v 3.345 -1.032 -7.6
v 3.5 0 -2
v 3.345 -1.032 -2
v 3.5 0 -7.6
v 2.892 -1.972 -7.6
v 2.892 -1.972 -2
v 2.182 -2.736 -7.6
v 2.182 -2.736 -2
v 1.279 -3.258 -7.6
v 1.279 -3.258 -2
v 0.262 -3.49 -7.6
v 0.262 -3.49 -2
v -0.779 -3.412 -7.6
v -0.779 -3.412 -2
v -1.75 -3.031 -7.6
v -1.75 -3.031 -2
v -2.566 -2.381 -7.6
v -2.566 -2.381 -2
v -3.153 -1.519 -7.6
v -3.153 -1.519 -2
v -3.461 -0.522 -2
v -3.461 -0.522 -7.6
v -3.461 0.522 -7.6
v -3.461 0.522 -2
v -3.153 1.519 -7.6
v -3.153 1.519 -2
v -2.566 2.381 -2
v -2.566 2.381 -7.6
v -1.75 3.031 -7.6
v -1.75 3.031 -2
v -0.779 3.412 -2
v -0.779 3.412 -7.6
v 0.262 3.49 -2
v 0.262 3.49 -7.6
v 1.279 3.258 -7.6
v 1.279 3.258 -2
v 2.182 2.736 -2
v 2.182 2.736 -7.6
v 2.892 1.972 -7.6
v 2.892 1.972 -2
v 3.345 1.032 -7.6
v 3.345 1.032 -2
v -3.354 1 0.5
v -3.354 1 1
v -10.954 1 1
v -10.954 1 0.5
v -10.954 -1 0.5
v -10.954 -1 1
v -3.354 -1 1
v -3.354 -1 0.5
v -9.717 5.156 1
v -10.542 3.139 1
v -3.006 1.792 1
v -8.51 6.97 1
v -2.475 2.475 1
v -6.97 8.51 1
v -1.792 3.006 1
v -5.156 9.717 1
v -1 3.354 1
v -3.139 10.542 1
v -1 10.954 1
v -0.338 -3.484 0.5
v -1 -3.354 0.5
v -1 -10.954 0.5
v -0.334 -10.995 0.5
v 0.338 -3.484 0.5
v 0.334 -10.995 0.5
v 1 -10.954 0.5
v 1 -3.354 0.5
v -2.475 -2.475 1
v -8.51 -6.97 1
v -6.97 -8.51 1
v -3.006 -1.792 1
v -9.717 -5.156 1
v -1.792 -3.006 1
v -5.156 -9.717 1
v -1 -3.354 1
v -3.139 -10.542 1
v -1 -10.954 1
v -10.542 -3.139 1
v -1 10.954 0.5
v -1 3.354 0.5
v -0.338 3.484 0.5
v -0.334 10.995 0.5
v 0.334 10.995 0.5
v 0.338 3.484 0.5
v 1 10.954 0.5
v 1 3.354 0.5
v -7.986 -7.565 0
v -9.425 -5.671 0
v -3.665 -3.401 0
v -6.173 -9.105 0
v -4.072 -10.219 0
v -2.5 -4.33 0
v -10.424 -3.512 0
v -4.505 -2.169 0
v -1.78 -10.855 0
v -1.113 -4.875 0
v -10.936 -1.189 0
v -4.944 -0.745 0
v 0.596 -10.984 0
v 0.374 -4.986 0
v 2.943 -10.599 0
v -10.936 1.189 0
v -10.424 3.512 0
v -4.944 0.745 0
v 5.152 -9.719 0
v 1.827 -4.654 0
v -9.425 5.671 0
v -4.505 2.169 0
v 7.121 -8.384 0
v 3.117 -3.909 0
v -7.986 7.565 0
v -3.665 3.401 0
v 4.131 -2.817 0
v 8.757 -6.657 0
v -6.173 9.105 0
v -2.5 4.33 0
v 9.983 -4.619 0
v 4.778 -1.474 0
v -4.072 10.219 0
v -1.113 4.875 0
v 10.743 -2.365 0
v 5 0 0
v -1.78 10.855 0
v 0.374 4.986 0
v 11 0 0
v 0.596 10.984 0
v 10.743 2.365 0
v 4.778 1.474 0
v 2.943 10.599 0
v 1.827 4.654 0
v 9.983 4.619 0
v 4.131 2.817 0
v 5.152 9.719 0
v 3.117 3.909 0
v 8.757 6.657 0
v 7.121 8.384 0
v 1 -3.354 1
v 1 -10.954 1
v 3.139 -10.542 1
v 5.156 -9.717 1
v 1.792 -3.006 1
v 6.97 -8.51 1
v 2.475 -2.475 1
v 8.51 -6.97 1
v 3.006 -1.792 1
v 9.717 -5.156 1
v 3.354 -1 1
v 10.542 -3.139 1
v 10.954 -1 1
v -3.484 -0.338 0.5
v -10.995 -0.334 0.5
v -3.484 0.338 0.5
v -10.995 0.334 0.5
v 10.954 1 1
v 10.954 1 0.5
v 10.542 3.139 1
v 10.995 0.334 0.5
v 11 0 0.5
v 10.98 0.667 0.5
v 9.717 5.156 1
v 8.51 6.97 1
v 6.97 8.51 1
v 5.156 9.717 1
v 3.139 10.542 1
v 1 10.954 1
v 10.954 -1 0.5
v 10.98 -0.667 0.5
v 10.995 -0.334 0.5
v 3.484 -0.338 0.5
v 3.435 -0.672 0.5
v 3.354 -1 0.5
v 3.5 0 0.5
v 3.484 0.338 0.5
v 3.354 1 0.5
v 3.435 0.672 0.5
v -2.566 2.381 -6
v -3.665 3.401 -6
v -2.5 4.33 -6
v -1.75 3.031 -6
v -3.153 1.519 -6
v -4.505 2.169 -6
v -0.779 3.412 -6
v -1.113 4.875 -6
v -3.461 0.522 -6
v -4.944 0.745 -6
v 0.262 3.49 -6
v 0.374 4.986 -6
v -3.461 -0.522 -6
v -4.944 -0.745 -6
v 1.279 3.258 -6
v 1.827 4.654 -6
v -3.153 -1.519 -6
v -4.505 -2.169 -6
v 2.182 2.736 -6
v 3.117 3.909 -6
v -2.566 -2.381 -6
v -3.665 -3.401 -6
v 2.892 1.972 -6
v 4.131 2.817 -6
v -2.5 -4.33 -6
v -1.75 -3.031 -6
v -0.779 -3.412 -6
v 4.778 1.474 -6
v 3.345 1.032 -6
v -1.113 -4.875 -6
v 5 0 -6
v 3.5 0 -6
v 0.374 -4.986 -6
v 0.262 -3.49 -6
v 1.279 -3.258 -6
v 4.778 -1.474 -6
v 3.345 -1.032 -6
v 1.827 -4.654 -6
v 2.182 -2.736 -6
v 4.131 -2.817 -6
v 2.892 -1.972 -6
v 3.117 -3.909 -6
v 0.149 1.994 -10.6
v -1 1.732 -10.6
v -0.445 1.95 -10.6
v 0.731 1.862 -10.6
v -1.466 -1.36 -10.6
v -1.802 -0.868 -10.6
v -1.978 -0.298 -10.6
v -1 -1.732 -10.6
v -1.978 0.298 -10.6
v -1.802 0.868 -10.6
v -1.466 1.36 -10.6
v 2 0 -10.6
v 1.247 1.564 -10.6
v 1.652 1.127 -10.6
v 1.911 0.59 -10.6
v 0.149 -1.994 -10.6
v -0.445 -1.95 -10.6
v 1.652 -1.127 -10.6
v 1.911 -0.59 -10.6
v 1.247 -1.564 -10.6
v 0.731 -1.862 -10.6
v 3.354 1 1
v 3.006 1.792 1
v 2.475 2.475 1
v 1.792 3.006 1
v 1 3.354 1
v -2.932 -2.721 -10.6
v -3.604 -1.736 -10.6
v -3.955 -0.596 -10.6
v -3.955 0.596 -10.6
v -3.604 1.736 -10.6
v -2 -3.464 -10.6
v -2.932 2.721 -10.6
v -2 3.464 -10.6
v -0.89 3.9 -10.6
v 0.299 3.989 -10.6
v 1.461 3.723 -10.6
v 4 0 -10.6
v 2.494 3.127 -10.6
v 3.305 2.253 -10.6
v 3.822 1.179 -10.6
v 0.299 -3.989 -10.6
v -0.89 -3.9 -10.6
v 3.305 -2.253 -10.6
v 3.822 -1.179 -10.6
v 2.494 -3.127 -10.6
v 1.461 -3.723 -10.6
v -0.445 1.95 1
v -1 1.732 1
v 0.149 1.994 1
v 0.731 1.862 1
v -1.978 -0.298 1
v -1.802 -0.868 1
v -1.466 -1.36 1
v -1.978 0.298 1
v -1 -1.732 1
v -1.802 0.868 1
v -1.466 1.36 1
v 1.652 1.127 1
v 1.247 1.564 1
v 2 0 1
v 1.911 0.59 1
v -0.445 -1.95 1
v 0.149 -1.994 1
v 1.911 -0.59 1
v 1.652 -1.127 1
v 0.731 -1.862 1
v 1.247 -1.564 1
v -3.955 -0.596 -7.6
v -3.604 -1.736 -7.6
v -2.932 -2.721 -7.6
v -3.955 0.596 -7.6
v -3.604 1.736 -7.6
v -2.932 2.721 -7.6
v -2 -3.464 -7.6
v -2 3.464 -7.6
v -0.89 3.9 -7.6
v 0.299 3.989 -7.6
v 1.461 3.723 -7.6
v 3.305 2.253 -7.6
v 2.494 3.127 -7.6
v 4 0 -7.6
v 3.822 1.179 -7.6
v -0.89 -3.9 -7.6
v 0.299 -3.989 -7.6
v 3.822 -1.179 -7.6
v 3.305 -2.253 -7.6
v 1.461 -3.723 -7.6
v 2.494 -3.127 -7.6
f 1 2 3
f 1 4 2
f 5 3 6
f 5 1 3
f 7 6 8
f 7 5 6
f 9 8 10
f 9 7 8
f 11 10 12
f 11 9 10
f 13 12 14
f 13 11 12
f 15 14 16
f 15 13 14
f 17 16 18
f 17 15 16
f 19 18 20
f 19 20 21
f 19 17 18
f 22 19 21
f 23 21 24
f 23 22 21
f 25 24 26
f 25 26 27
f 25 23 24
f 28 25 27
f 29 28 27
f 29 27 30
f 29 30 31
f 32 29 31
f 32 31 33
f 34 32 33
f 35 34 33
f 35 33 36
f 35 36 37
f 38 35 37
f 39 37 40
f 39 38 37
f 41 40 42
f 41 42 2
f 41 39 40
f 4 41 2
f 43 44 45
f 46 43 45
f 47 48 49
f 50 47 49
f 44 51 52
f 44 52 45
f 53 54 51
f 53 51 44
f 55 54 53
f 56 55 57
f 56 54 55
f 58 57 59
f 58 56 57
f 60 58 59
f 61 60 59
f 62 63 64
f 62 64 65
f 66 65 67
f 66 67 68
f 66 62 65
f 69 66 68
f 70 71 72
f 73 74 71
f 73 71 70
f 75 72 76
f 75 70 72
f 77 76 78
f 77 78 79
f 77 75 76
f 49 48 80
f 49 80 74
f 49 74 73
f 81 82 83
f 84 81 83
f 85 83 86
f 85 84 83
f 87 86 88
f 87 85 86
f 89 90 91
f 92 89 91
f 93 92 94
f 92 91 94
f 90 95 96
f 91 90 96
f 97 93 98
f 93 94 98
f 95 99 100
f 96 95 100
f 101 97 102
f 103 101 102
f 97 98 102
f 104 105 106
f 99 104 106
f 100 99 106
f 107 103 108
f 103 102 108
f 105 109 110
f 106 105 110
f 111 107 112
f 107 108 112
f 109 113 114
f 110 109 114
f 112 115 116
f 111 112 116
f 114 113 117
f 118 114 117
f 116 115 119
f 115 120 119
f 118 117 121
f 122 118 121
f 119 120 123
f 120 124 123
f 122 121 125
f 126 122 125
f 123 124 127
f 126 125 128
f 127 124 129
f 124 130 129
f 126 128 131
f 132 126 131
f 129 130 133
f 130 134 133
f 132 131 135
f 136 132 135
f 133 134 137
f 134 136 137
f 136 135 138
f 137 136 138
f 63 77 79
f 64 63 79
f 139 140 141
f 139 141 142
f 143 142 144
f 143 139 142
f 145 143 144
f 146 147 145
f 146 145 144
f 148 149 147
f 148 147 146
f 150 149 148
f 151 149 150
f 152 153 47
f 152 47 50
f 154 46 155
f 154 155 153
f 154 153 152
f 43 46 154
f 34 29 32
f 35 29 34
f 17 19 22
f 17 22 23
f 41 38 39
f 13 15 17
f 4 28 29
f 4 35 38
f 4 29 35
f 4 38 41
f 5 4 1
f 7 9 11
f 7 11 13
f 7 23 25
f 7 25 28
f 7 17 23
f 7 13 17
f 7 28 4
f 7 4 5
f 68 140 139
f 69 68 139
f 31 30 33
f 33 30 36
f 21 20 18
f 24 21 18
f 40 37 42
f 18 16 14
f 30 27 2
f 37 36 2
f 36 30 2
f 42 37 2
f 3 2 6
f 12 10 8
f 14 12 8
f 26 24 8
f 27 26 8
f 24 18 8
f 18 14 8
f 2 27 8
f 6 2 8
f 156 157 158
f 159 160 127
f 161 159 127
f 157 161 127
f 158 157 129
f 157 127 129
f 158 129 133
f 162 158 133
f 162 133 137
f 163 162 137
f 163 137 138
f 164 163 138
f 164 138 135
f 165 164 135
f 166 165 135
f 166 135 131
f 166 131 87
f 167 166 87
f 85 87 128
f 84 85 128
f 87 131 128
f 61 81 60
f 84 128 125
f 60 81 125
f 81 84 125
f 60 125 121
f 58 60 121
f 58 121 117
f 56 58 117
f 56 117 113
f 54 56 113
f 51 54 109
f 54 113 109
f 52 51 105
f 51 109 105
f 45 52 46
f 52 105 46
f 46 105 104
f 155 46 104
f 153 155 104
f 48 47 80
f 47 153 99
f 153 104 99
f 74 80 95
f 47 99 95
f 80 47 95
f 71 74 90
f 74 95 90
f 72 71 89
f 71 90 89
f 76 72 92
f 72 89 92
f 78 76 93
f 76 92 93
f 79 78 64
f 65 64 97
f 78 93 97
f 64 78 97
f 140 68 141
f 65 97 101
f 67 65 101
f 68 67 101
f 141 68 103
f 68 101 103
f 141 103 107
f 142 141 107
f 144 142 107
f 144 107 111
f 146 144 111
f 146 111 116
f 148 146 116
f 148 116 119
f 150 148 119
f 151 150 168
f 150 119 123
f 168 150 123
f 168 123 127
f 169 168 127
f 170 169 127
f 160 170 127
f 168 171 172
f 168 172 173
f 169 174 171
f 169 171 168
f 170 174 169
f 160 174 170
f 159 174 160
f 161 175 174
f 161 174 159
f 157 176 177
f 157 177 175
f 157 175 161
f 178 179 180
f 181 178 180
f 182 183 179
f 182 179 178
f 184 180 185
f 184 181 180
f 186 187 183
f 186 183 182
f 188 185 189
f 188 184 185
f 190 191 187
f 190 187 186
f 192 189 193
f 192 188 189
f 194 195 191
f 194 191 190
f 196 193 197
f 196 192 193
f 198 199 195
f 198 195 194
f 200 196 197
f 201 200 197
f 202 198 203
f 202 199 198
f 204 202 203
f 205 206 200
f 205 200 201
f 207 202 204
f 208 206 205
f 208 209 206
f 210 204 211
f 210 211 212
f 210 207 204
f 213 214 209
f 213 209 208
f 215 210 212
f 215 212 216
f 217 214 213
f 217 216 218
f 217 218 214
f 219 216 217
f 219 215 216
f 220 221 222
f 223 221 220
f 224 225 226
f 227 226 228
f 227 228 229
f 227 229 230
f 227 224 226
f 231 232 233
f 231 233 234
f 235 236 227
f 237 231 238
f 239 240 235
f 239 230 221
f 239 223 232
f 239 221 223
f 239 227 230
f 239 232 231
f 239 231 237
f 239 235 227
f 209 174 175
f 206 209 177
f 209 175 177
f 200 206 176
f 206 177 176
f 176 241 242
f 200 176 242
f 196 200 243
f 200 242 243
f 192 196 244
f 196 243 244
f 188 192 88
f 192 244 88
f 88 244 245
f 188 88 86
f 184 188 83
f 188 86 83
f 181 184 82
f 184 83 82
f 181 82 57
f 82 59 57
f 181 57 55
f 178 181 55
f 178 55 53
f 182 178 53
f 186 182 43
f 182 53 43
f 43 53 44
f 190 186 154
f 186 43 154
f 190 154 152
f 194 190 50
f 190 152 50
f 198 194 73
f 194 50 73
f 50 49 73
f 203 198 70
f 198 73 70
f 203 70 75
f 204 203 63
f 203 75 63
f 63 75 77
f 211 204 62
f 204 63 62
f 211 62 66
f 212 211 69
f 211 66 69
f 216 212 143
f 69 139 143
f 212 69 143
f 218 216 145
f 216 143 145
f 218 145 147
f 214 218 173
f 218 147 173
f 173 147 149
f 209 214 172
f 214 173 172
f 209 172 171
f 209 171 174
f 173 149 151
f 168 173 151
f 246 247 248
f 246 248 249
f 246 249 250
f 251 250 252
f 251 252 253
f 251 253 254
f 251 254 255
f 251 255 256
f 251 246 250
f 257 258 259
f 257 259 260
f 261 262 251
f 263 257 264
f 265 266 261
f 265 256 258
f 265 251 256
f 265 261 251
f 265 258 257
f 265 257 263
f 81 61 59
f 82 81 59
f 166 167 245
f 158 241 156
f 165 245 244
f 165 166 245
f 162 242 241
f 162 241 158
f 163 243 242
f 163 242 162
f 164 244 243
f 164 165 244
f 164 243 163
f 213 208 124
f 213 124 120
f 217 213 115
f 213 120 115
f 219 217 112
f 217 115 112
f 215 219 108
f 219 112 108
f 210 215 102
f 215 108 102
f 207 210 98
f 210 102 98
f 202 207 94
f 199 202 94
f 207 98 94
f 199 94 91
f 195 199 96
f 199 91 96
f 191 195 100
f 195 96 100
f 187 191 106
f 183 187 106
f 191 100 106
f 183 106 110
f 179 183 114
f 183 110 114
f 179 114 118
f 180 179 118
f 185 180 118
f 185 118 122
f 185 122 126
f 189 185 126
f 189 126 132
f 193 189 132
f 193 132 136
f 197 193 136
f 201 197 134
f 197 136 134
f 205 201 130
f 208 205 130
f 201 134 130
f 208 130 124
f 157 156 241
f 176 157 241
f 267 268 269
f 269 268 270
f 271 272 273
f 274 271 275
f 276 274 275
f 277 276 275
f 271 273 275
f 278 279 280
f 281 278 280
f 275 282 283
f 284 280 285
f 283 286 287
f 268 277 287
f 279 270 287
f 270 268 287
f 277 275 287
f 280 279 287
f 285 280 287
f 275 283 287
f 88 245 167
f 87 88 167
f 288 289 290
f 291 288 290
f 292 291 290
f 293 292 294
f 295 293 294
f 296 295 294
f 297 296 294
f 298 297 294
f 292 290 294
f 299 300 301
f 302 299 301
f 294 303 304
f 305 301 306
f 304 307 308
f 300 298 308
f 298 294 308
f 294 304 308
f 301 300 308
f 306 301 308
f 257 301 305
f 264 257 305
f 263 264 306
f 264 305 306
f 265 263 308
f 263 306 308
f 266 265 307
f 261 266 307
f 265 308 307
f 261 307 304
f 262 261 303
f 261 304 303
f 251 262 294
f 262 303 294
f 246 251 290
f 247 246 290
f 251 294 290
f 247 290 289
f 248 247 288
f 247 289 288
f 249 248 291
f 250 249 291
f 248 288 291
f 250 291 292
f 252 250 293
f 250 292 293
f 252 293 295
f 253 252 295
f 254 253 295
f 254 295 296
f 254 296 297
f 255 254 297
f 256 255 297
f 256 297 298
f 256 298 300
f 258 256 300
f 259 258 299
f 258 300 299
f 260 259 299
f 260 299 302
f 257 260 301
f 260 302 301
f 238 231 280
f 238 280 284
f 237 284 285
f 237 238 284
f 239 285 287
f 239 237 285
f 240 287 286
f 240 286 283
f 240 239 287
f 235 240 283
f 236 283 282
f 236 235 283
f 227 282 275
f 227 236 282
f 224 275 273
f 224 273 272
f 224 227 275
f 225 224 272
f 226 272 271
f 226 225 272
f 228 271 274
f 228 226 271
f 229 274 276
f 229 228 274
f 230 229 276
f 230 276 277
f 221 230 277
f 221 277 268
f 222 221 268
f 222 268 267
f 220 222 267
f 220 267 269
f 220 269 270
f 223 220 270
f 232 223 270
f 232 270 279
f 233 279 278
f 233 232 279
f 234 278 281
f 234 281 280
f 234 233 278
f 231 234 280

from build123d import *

# Parameters (mm, degrees)
F0_R          = 11
F1_DEPTH      = 1
F2_R          = 5
F3_DEPTH      = 6
F4_R          = 3.5
F5_DEPTH      = 11.6
F7_DEPTH      = 0.5
F8_R          = 3.5
F9_DEPTH      = 1.6
F9_DEPTH_BACK = 4
F10_R         = 4
F11_DEPTH     = 3
F12_R         = 2
F13_DEPTH     = 11.6


with BuildPart() as f1:
    # F0 (on Top) → F1 (new body)
    with BuildSketch(Plane.XY):
        Circle(F0_R)
    extrude(amount=F1_DEPTH)

    # F2 (on face) → F3 (join)
    with BuildSketch(Plane(origin=(0, 0, 0), x_dir=(1, 0, 0), z_dir=(0, 0, -1))):
        Circle(F2_R)
    extrude(amount=F3_DEPTH)

    # F4 (on face) → F5 (cut)
    with BuildSketch(Plane.XY.offset(1)):
        Circle(F4_R)
    extrude(amount=-F5_DEPTH, mode=Mode.SUBTRACT)

    # F6 (on face) → F7 (cut)
    with BuildSketch(Plane.XY.offset(1)):
        with BuildLine():
            Line((-10.9544511501, -1), (-10.9544511501, 1))
            ThreePointArc((-10.9544511501, 1), (-11, 0), (-10.9544511501, -1))
        make_face()
        with BuildLine():
            Line((-3.3541019662, 1), (-10.9544511501, 1))
            Line((-10.9544511501, 1), (-10.9544511501, -1))
            Line((-10.9544511501, -1), (-3.3541019662, -1))
            ThreePointArc((-3.3541019662, -1), (-3.5, 0), (-3.3541019662, 1))
        make_face()
        with BuildLine():
            ThreePointArc((10.9544511501, -1), (11, 0), (10.9544511501, 1))
            Line((10.9544511501, 1), (10.9544511501, -1))
        make_face()
        with BuildLine():
            Line((10.9544511501, -1), (10.9544511501, 1))
            Line((10.9544511501, 1), (3.3541019662, 1))
            ThreePointArc((3.3541019662, 1), (3.5, 0), (3.3541019662, -1))
            Line((3.3541019662, -1), (10.9544511501, -1))
        make_face()
        with BuildLine():
            ThreePointArc((1, 10.9544511501), (0, 11), (-1, 10.9544511501))
            Line((-1, 10.9544511501), (1, 10.9544511501))
        make_face()
        with BuildLine():
            Line((1, 10.9544511501), (-1, 10.9544511501))
            Line((-1, 10.9544511501), (-1, 3.3541019662))
            ThreePointArc((-1, 3.3541019662), (0, 3.5), (1, 3.3541019662))
            Line((1, 3.3541019662), (1, 10.9544511501))
        make_face()
        with BuildLine():
            Line((-1, -3.3541019662), (-1, -10.9544511501))
            Line((-1, -10.9544511501), (1, -10.9544511501))
            Line((1, -10.9544511501), (1, -3.3541019662))
            ThreePointArc((1, -3.3541019662), (0, -3.5), (-1, -3.3541019662))
        make_face()
        with BuildLine():
            Line((1, -10.9544511501), (-1, -10.9544511501))
            ThreePointArc((-1, -10.9544511501), (0, -11), (1, -10.9544511501))
        make_face()
    extrude(amount=-F7_DEPTH, mode=Mode.SUBTRACT)


with BuildPart() as f9:
    # F8 (on face) → F9 (new body, two sides)
    with BuildSketch(Plane(origin=(0, 0, -6), x_dir=(1, 0, 0), z_dir=(0, 0, -1))) as f9_sk:
        Circle(F8_R)
    extrude(amount=F9_DEPTH)
    extrude(f9_sk.sketch, amount=-F9_DEPTH_BACK)


with BuildPart() as f11:
    # F10 (on face) → F11 (new body)
    with BuildSketch(Plane(origin=(0, 0, -7.6), x_dir=(1, 0, 0), z_dir=(0, 0, -1))):
        Circle(F10_R)
    extrude(amount=F11_DEPTH)


with BuildPart() as f13:
    # F12 (on face) → F13 (new body)
    with BuildSketch(Plane(origin=(0, 0, -10.6), x_dir=(1, 0, 0), z_dir=(0, 0, -1))):
        Circle(F12_R)
    extrude(amount=-F13_DEPTH)


solid = Compound([f1.part, f9.part, f11.part, f13.part])
